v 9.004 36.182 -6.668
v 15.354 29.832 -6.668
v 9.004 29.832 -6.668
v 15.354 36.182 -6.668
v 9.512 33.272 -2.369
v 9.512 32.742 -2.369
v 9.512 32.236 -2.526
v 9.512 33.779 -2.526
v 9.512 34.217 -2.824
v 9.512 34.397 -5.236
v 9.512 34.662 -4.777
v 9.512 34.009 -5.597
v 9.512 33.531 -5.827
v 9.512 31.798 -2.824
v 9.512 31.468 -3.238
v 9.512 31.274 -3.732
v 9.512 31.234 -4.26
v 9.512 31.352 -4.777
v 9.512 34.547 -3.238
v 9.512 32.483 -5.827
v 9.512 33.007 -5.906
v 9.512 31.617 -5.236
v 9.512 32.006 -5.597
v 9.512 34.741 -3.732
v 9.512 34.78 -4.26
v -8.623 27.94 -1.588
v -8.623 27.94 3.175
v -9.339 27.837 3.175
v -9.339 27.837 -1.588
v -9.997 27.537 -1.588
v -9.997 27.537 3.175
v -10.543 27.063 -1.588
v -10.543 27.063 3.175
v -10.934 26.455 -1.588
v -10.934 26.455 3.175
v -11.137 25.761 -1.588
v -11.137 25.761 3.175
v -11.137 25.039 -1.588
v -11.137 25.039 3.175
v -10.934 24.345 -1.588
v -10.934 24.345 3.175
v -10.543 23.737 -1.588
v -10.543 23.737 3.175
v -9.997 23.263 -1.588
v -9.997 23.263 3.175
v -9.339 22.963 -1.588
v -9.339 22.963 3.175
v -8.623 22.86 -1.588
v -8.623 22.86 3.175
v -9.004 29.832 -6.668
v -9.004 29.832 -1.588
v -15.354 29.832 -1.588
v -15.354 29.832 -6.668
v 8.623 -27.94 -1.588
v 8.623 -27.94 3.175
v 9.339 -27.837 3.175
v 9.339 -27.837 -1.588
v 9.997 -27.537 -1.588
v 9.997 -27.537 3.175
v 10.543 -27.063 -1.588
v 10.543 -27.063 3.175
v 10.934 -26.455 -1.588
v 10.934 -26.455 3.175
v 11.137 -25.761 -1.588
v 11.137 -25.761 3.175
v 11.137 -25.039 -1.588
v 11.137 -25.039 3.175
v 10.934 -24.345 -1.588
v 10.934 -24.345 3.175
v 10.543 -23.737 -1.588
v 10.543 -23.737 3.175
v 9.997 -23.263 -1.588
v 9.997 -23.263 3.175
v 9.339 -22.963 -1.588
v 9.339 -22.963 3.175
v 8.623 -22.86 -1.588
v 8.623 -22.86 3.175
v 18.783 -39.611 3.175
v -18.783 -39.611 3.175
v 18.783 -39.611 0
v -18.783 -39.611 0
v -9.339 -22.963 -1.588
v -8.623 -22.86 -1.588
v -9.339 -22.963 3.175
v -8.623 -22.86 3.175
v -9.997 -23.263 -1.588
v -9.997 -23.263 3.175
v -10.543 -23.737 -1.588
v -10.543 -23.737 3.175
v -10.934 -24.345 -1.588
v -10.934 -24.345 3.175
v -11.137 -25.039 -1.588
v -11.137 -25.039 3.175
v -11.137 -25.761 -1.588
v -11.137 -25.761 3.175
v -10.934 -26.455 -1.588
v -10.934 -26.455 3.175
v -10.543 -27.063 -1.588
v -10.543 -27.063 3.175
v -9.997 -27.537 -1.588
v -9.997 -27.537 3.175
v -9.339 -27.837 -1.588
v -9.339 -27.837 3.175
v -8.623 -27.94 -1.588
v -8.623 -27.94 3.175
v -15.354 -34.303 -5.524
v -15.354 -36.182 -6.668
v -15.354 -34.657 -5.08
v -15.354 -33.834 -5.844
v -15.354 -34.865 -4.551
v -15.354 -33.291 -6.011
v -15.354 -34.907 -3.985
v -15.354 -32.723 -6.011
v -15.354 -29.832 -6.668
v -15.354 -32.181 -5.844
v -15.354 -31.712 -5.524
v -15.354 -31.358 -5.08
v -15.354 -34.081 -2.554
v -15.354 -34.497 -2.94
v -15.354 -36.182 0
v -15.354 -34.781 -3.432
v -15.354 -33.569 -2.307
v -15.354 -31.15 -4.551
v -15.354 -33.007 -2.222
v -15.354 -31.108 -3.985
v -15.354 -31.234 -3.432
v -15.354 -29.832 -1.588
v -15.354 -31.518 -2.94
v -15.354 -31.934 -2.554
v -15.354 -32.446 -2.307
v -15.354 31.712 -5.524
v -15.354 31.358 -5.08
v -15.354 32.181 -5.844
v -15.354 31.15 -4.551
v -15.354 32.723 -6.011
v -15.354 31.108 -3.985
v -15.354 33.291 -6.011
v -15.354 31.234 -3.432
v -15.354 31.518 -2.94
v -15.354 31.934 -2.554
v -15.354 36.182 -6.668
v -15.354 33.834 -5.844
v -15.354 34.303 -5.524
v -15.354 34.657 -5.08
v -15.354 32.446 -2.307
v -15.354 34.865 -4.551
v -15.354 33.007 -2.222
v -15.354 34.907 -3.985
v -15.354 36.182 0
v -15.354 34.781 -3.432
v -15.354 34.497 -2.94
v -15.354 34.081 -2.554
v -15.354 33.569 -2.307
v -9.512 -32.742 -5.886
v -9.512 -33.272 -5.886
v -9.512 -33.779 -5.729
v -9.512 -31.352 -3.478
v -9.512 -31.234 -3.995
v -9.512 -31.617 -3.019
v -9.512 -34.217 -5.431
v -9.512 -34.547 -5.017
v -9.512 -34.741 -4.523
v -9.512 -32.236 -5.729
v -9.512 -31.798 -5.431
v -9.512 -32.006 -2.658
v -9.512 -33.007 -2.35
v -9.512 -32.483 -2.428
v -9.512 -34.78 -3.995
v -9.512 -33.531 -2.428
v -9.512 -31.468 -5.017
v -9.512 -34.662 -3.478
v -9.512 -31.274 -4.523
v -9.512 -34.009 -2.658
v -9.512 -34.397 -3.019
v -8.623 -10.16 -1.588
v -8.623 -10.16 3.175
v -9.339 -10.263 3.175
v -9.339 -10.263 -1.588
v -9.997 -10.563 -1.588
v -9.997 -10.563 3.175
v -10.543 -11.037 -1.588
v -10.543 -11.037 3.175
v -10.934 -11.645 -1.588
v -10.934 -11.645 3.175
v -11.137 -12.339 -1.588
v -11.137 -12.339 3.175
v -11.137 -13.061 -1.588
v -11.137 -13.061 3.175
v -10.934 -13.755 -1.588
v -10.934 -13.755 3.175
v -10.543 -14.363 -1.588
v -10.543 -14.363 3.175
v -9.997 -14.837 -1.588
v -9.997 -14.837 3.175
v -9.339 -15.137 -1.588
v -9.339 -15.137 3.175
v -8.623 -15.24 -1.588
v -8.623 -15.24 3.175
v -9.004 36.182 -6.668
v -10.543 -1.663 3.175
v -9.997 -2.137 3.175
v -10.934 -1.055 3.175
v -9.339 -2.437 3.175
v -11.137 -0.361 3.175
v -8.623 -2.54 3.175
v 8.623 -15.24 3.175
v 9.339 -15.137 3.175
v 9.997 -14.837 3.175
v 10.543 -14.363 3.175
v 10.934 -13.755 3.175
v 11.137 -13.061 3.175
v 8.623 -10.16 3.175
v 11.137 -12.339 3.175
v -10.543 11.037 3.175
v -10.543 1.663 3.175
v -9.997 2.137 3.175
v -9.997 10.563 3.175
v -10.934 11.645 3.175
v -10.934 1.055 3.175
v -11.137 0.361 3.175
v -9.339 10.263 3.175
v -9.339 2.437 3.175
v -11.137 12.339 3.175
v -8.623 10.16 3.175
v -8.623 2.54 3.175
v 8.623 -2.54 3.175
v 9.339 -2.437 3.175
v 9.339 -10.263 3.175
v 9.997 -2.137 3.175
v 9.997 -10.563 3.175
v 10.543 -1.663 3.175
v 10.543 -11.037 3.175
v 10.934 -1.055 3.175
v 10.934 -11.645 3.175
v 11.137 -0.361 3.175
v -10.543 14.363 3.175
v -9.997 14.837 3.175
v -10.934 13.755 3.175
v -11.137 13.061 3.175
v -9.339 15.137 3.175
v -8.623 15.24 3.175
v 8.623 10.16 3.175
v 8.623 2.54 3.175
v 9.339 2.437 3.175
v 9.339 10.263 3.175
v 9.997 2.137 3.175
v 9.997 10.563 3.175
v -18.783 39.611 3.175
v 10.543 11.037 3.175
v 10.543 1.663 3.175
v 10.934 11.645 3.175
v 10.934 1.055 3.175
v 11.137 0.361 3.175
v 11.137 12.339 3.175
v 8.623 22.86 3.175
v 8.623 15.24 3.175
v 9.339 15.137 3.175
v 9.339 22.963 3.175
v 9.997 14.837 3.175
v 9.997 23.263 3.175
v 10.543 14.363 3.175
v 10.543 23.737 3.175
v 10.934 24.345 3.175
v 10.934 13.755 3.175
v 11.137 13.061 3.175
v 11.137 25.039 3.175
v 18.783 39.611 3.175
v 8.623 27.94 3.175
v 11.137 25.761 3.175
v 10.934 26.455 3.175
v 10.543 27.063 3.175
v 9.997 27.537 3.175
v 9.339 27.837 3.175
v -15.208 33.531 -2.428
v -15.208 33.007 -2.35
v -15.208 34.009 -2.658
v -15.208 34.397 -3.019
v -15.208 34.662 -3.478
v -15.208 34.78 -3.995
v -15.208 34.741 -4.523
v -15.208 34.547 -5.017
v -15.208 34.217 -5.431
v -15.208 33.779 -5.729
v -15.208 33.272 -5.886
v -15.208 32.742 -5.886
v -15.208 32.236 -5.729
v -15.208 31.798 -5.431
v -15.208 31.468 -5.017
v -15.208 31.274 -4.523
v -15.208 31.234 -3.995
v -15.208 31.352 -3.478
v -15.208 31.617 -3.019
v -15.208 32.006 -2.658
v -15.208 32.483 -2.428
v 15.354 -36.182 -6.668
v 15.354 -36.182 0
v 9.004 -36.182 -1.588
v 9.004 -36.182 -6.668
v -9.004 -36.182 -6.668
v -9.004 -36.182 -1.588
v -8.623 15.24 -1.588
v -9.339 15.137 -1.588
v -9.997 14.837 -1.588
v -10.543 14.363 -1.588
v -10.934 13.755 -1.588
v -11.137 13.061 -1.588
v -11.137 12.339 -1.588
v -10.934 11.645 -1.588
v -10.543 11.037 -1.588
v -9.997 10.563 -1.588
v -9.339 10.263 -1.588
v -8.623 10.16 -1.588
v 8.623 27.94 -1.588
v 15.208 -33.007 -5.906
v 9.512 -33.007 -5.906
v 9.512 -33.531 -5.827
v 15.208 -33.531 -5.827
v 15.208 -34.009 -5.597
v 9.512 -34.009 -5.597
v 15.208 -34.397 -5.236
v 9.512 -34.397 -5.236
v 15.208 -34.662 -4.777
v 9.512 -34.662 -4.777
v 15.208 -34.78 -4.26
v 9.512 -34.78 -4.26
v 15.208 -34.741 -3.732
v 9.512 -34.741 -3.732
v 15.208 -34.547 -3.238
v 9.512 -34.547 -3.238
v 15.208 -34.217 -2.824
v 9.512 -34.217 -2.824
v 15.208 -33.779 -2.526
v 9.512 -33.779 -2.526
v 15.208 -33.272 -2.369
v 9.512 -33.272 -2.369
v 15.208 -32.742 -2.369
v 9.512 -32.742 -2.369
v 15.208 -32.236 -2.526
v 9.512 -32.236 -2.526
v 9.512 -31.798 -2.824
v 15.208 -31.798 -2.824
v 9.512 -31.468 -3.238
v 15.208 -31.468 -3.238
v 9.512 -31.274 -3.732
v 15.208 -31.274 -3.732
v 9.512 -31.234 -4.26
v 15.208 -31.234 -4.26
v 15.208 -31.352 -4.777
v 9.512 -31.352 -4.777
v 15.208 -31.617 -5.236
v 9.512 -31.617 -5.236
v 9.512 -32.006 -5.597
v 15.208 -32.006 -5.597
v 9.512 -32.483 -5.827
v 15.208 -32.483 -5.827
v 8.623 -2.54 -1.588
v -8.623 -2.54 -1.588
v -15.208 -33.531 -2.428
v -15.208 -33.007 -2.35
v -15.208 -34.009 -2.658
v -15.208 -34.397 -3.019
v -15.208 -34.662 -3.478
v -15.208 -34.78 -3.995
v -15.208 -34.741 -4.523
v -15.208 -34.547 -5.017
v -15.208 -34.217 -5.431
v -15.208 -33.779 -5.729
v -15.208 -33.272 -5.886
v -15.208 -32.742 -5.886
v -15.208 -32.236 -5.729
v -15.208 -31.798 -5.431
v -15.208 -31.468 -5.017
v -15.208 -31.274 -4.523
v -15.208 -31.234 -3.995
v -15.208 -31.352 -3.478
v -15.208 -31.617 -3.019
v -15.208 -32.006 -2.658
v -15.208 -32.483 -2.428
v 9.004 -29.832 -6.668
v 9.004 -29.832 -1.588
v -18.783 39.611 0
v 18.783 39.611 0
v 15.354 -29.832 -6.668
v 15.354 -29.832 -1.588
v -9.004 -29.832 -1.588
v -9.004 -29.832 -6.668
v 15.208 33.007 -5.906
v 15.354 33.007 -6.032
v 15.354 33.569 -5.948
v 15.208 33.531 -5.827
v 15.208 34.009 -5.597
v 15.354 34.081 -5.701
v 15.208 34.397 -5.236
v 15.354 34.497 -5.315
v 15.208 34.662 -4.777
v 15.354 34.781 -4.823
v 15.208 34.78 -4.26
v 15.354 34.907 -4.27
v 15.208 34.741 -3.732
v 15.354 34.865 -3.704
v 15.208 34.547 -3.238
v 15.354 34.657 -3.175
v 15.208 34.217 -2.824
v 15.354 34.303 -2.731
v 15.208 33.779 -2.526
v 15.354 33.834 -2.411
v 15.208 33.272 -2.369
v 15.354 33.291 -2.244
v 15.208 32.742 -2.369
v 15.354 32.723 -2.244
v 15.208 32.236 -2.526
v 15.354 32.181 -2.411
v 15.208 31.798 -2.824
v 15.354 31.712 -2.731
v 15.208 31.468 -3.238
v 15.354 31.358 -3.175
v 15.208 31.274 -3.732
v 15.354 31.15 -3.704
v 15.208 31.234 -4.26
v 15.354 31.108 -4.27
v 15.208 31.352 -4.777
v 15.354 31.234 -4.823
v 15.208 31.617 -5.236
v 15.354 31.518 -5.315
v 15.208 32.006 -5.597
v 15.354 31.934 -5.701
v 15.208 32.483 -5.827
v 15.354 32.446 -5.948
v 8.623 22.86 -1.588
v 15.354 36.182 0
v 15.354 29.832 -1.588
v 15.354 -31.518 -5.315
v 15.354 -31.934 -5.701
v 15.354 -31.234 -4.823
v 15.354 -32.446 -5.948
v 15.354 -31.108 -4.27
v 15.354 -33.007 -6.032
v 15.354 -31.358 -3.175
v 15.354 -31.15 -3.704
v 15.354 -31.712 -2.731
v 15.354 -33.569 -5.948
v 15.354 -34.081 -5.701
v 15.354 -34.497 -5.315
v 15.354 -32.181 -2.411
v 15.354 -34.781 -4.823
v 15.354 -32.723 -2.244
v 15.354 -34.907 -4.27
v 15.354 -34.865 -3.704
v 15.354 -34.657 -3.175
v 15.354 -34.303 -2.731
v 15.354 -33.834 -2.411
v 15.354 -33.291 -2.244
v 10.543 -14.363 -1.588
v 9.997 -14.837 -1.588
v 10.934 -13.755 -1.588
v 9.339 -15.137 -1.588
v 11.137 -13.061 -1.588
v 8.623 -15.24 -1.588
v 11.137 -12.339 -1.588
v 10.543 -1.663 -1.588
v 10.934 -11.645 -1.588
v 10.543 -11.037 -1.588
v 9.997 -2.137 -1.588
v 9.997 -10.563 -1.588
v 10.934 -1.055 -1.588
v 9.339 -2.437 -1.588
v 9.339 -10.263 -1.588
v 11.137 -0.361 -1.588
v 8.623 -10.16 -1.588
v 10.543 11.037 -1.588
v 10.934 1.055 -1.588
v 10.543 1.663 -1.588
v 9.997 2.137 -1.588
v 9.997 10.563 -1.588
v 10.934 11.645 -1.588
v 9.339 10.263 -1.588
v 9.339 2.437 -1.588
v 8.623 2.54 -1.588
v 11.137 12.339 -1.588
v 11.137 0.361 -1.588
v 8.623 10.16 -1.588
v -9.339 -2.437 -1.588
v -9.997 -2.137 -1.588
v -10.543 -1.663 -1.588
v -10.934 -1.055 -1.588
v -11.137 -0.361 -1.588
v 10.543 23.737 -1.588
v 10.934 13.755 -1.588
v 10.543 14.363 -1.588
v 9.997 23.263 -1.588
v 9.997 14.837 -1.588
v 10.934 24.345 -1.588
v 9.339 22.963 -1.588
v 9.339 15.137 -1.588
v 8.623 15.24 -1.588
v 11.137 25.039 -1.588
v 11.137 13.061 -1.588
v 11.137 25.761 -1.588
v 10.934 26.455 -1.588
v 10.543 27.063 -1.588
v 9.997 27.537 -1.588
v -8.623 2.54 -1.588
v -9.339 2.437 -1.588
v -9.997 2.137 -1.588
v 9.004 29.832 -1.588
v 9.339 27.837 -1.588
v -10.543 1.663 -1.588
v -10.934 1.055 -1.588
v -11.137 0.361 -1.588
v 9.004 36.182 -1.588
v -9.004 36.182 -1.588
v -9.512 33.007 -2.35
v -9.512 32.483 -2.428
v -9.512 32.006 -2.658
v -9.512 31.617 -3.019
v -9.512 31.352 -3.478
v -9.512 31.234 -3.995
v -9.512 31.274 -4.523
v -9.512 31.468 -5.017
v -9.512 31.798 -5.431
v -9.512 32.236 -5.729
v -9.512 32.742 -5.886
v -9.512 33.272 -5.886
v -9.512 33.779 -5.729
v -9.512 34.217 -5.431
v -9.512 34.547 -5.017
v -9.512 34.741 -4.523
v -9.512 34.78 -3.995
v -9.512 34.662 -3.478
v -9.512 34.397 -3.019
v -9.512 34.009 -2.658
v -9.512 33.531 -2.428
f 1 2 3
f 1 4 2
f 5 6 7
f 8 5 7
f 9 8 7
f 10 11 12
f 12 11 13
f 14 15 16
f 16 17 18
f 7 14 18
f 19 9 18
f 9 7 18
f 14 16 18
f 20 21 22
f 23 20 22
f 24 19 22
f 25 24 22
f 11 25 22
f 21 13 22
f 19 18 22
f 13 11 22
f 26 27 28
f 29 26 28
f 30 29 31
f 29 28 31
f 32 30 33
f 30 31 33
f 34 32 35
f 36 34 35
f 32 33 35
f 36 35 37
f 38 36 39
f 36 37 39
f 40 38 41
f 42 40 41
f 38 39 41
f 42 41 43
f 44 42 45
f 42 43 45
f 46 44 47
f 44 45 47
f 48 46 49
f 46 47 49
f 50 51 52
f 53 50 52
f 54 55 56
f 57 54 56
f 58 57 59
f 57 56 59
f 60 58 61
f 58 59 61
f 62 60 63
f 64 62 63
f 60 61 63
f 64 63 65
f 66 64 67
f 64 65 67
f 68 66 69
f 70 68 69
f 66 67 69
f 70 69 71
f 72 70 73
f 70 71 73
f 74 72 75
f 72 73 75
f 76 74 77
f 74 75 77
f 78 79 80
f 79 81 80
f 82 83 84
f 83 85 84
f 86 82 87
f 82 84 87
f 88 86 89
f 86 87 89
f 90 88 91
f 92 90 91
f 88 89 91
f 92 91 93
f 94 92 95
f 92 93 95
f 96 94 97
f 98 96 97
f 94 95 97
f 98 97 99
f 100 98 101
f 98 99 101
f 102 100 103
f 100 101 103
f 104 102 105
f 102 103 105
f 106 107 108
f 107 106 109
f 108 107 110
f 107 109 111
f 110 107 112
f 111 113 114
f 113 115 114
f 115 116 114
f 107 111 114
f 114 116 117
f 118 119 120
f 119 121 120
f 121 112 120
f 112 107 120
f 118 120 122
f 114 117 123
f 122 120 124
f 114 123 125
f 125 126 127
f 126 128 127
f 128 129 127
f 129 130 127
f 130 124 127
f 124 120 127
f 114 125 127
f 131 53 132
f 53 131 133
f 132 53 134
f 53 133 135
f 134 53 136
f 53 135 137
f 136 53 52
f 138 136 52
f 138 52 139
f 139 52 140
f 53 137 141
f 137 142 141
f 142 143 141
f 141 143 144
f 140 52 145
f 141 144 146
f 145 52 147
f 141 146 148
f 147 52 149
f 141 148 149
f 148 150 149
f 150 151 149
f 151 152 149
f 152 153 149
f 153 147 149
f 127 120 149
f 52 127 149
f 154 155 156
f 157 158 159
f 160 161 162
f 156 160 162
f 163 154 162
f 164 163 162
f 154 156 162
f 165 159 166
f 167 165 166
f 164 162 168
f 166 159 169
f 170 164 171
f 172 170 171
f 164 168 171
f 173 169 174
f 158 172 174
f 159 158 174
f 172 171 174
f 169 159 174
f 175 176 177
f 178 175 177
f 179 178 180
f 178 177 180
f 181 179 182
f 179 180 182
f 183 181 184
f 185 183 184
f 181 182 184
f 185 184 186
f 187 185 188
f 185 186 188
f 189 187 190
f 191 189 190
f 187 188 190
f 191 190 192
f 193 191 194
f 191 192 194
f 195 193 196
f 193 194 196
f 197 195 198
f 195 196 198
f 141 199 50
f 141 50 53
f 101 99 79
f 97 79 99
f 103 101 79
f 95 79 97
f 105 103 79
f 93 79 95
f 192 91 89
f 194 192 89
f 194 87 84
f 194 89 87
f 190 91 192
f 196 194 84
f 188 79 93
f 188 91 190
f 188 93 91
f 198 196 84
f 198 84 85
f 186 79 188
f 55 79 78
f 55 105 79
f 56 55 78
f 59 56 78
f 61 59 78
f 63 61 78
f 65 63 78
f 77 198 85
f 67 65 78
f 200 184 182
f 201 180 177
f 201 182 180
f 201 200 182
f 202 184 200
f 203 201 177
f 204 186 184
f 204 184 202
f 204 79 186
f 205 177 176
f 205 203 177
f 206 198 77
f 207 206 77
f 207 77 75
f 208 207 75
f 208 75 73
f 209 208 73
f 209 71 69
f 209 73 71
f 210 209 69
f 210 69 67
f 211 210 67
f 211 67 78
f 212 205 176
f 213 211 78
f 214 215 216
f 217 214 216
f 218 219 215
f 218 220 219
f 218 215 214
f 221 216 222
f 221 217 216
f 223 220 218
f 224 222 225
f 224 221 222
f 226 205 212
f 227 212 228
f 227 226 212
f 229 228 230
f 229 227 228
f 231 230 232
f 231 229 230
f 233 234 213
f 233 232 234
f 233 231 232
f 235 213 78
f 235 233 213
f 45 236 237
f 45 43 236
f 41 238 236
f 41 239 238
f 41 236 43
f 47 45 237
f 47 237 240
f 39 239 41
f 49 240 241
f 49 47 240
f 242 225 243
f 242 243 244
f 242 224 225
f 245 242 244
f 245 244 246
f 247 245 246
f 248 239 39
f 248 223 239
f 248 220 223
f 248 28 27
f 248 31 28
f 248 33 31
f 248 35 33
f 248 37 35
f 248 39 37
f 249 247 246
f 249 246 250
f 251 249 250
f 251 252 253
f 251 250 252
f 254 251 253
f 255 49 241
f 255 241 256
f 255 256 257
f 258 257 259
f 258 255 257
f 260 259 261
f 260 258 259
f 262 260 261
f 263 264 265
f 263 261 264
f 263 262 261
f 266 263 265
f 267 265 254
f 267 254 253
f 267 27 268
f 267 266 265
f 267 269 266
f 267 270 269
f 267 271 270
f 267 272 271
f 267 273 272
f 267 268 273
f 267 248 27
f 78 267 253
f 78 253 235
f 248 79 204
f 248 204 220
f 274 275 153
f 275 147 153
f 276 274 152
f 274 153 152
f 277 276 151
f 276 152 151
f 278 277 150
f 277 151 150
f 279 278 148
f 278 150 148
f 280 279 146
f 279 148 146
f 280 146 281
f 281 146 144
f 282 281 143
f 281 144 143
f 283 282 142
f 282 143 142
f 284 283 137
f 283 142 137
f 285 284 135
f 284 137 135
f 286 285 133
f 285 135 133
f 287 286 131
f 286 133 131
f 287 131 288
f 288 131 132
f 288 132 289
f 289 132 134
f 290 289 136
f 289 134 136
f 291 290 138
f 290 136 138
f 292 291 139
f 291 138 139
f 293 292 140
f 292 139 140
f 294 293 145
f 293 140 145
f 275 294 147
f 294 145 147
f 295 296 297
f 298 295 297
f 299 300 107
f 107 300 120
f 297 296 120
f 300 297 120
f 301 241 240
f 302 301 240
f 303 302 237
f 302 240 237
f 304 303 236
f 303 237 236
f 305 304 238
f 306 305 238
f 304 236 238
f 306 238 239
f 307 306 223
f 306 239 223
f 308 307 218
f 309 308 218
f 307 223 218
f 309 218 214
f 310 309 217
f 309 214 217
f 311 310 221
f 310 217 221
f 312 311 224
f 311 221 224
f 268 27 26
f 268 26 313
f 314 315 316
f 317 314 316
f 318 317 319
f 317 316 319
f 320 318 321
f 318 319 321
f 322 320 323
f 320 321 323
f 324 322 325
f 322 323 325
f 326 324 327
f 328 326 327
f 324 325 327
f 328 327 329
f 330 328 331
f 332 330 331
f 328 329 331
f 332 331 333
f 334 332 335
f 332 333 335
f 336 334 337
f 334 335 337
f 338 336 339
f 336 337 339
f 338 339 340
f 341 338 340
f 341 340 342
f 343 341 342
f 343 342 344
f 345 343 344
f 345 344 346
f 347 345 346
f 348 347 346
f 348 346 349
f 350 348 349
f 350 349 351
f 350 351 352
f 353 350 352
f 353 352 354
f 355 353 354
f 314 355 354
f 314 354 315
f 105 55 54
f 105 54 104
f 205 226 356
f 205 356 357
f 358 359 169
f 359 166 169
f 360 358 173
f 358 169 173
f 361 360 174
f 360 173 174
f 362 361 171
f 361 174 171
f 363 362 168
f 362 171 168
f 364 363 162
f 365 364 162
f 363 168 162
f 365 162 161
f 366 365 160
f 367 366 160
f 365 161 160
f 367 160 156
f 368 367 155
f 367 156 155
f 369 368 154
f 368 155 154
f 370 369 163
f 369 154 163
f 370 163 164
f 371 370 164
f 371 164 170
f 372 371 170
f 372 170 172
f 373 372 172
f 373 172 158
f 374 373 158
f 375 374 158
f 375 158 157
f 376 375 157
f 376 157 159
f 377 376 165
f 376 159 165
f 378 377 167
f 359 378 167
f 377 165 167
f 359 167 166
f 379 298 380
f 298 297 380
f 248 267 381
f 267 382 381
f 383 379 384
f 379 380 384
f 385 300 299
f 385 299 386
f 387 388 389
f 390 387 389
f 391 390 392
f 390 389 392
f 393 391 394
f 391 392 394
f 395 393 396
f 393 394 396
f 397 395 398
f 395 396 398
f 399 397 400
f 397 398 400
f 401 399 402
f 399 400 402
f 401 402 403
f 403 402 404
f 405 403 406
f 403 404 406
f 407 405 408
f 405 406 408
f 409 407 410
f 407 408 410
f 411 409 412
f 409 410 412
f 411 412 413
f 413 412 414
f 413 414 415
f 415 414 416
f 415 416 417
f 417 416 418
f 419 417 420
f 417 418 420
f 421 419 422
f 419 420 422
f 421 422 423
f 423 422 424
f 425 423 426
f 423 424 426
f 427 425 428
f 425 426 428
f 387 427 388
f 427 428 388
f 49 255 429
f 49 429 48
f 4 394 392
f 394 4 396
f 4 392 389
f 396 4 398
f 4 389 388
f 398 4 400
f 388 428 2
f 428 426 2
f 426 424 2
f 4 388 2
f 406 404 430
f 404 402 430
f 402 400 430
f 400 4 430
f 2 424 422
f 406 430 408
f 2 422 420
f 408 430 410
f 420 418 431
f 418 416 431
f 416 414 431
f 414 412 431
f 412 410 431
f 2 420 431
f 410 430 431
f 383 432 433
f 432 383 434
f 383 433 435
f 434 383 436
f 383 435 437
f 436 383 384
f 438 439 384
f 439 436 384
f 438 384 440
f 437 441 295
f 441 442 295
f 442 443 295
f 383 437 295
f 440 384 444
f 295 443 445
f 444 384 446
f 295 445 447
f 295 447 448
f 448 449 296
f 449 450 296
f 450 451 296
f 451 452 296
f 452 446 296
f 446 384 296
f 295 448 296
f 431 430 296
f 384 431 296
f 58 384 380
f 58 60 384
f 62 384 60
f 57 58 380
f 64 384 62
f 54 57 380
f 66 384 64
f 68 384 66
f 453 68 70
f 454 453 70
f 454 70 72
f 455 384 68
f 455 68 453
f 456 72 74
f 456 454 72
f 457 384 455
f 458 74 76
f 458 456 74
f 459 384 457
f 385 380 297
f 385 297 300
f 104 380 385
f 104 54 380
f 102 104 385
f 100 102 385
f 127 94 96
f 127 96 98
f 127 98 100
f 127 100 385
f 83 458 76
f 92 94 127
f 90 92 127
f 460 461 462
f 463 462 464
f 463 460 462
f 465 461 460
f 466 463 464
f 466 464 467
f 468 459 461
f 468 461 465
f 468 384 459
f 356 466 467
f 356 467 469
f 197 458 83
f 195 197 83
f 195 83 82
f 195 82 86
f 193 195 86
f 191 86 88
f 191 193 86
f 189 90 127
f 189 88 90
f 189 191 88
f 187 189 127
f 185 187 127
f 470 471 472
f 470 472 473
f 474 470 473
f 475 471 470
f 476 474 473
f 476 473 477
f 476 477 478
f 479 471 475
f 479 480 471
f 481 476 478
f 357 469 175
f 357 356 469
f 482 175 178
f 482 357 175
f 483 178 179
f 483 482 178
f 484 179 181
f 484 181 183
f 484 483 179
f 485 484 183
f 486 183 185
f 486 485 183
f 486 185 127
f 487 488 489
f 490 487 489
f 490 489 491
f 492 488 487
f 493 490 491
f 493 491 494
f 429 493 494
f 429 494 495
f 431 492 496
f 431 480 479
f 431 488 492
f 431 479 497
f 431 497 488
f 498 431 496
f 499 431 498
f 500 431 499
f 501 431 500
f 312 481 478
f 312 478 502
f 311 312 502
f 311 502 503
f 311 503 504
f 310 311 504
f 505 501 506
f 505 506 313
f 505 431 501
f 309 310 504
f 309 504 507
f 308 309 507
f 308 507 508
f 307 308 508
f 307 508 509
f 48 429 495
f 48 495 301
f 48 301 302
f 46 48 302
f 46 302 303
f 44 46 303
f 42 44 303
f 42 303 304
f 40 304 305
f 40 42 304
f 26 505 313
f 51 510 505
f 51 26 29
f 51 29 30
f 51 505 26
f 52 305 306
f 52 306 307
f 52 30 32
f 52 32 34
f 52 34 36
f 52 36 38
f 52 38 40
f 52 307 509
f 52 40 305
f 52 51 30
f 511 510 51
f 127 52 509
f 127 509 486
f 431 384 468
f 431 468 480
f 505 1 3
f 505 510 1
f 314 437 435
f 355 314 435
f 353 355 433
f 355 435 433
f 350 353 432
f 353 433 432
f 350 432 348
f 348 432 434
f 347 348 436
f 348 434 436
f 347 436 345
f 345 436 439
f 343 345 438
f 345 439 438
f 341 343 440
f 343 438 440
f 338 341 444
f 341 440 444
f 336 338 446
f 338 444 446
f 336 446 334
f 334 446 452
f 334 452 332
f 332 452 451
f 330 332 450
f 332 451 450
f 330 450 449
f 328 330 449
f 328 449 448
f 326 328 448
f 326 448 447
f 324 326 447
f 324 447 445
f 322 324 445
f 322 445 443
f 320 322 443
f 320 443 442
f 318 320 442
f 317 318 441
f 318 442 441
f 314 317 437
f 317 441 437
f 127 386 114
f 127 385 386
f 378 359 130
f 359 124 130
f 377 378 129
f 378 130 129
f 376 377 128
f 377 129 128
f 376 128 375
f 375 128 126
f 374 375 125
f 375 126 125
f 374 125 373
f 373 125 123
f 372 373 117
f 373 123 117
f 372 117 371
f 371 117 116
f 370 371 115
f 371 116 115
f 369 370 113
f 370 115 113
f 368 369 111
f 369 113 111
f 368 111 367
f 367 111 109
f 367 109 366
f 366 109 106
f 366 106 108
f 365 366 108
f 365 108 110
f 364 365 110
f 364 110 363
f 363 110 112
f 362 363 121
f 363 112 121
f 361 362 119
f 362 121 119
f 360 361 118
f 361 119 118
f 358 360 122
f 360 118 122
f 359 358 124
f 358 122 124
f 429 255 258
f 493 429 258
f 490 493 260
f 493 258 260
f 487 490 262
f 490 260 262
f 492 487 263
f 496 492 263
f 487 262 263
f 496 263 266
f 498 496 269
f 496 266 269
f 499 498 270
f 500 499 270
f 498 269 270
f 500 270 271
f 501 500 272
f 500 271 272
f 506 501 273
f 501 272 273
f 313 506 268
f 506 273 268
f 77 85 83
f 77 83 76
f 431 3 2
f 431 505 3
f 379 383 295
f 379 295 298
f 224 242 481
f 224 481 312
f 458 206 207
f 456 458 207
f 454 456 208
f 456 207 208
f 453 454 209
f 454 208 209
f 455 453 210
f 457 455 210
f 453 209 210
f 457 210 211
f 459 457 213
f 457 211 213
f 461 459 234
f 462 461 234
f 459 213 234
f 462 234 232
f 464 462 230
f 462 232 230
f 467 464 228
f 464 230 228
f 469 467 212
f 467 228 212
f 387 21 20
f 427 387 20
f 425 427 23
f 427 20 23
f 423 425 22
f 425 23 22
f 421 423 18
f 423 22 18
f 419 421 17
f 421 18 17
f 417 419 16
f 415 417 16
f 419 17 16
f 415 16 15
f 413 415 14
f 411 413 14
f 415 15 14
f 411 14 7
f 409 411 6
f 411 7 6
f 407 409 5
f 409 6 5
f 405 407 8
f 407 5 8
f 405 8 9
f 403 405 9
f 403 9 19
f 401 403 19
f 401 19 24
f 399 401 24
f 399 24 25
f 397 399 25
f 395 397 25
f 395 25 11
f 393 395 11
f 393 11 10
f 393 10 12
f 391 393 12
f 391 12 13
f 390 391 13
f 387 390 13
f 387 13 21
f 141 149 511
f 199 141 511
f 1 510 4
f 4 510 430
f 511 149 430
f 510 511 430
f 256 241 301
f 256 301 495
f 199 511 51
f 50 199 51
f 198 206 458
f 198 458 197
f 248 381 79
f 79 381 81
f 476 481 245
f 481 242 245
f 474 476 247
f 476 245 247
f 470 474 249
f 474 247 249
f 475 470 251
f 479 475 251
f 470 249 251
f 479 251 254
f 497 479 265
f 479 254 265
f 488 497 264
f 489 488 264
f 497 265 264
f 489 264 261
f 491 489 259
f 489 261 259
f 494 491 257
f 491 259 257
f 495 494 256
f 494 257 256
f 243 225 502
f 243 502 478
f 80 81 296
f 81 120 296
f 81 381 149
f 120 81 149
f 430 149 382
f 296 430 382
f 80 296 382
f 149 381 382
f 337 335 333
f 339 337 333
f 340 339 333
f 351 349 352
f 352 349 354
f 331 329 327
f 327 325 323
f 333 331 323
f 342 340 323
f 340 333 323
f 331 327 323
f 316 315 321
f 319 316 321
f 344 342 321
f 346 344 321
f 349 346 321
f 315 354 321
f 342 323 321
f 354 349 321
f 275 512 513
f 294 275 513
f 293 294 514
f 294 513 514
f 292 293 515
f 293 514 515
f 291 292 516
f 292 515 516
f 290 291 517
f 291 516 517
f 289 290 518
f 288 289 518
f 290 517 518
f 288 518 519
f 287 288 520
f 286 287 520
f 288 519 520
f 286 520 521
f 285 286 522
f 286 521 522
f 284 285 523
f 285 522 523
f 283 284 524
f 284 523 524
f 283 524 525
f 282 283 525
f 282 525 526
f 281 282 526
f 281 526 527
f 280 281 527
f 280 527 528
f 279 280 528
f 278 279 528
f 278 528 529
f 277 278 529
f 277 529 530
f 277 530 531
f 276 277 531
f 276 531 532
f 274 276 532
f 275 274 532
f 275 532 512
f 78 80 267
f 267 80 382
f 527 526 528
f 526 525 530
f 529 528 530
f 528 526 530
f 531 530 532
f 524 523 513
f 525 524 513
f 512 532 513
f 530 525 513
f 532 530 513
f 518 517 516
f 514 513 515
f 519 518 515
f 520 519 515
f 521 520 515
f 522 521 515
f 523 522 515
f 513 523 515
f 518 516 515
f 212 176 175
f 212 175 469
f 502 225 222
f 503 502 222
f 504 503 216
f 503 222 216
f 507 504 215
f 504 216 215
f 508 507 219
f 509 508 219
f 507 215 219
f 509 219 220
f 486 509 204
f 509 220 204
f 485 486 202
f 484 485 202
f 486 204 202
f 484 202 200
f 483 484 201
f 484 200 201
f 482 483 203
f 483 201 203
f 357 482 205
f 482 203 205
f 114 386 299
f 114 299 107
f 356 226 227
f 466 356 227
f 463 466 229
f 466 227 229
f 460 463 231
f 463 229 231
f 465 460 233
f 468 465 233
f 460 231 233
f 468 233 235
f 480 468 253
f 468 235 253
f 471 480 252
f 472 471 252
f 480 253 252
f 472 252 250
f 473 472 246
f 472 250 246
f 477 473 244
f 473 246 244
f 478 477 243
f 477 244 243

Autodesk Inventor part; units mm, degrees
ref_plane "YZ Plane" through (0, 0, 0) normal (1, 0, 0) x (0, 1, 0)
ref_plane "XZ Plane" through (0, 0, 0) normal (0, 1, 0) x (-1, 0, 0)
ref_plane "XY Plane" through (0, 0, 0) normal (0, 0, 1) x (1, 0, 0)
sketch "Sketch1" plane through (0, 0, 0) normal (0, 0, 1) x (1, 0, 0)
  line L0 (-18.7833, 39.6114) -> (-18.7833, -39.6114) projected
  line L1 (-18.7833, -39.6114) -> (18.7833, -39.6114) projected
  line L2 (18.7833, -39.6114) -> (18.7833, 39.6114) projected
  line L3 (18.7833, 39.6114) -> (-18.7833, 39.6114) projected
  line L4 (-15.6083, 36.4364) -> (15.6083, 36.4364) projected
  line L5 (15.6083, 36.4364) -> (15.6083, -36.4364) projected
  line L6 (15.6083, -36.4364) -> (-15.6083, -36.4364) projected
  line L7 (-15.6083, -36.4364) -> (-15.6083, 36.4364) projected
  point P0 (0, 0)
extrude "Extrusion1" add sketch "Sketch1" along normal blind 3.175 contours L3 L2 L1 L0 | L4 L5 L6 L7
sketch "Sketch2" plane through (0, 0, 0) normal (0, 0, -1) x (-1, 0, 0)
  line L0 (-15.6083, -36.4364) -> (15.6083, -36.4364) projected
  line L1 (-15.6083, 36.4364) -> (-15.6083, -36.4364) projected
  line L2 (15.6083, 36.4364) -> (-15.6083, 36.4364) projected
  line L3 (15.6083, -36.4364) -> (15.6083, 36.4364) projected
  line L4 (-15.3543, 36.1824) -> (-15.3543, -36.1824)
  line L5 (-15.3543, -36.1824) -> (15.3543, -36.1824)
  line L6 (15.3543, -36.1824) -> (15.3543, 36.1824)
  line L7 (15.3543, 36.1824) -> (-15.3543, 36.1824)
  point P0 (0, 0)
  dimension "d2" = 0.254
extrude "Extrusion2" add sketch "Sketch2" along normal blind 1.5875 contours L7 L6 L5 L4
sketch "Sketch3" plane through (0, 0, -1.5875) normal (0, 0, -1) x (-1, 0, 0)
  line L0 (-15.3543, 36.1824) -> (-15.3543, -36.1824) projected
  line L1 (-15.3543, 36.1824) -> (-9.0043, 36.1824)
  line L2 (-9.0043, 36.1824) -> (-9.0043, 29.8324)
  line L3 (-9.0043, 29.8324) -> (-15.3543, 29.8324)
  line L4 (-15.3543, 29.8324) -> (-15.3543, 36.1824)
  line L5 (15.3543, 36.1824) -> (-15.3543, 36.1824) projected
  line L6 (15.3543, 36.1824) -> (9.0043, 36.1824)
  line L7 (9.0043, 36.1824) -> (9.0043, 29.8324)
  line L8 (9.0043, 29.8324) -> (15.3543, 29.8324)
  line L9 (15.3543, 29.8324) -> (15.3543, 36.1824)
  line L10 (-15.3543, -36.1824) -> (15.3543, -36.1824) projected
  line L11 (-15.3543, -36.1824) -> (-9.0043, -36.1824)
  line L12 (-9.0043, -36.1824) -> (-9.0043, -29.8324)
  line L13 (-9.0043, -29.8324) -> (-15.3543, -29.8324)
  line L14 (-15.3543, -29.8324) -> (-15.3543, -36.1824)
  line L15 (15.3543, 36.1824) -> (15.3543, -36.1824) projected
  line L16 (15.3543, -36.1824) -> (9.0043, -36.1824)
  line L17 (9.0043, -36.1824) -> (9.0043, -29.8324)
  line L18 (9.0043, -29.8324) -> (15.3543, -29.8324)
  line L19 (15.3543, -29.8324) -> (15.3543, -36.1824)
  point P0 (0, 0)
  dimension "d5" = 6.35
  dimension "d6" = 6.35
  dimension "d7" = 6.35
  dimension "d8" = 6.35
  dimension "d9" = 6.35
  dimension "d10" = 6.35
  dimension "d11" = 6.35
  dimension "d12" = 6.35
extrude "Extrusion3" add sketch "Sketch3" along normal blind 5.08 contours L1 L2 L3 L0 | L13 L12 L10 L0 | L5 L9 L8 L7 | L17 L18 L15 L10
sketch "Sketch4" plane through (15.3543, -36.1824, 0) normal (1, 0, 0) x (0, 0, -1)
  line L0 (6.6675, 66.0147) -> (6.6675, 72.3647) projected
  line L1 (0, 72.3647) -> (0, 0) projected
  line L2 (6.6675, 0) -> (6.6675, 6.35) projected
  line L3 (1.5875, 66.0147) -> (1.5875, 6.35) projected
  line L4 (0, 72.3647) -> (6.6675, 72.3647) projected
  line L5 (1.5875, 66.0147) -> (6.6675, 72.3647)
  line L6 (1.5875, 6.35) -> (6.6675, 6.35) projected
  line L7 (6.6675, 6.35) -> (6.6675, 0) projected
  line L8 (1.5875, 6.35) -> (6.6675, 0)
  point P0 (0, 36.1824)
  point P1 (4.1275, 3.175)
  point P2 (4.1275, 69.1897)
sketch "Sketch5" plane through (-15.3543, -36.1824, 0) normal (-1, 0, 0) x (0, 0, 1)
  point P0 (0, 36.1824)
  point P1 (-4.1275, 69.1897)
  point P2 (-4.1275, 3.175)
hole "Hole1" at (15.3543, 33.0074, -4.1275) at (15.3543, -33.0074, -4.1275) direction (-1, 0, 0) diameter 3.556 depth 5.842 countersink diameter 3.81 countersink angle 82
hole "Hole2" at (-15.3543, 33.0074, -4.1275) at (-15.3543, -33.0074, -4.1275) direction (1, 0, 0) diameter 3.556 depth 5.842 countersink diameter 3.81 countersink angle 82
sketch "Sketch6" plane through (0, 0, 3.175) normal (0, 0, 1) x (1, 0, 0)
  line L0 (-8.6233, 0) -> (8.6233, 0) construction
  line L1 (-8.6233, 2.54) -> (8.6233, 2.54)
  line L2 (8.6233, -2.54) -> (-8.6233, -2.54)
  arc A0 (-8.6233, 2.54) -> (-8.6233, -2.54) centre (-8.6233, 0) ccw
  arc A1 (8.6233, -2.54) -> (8.6233, 2.54) centre (8.6233, 0) ccw
  line L3 (-18.7833, 39.6114) -> (-18.7833, -39.6114) projected
  line L4 (18.7833, -39.6114) -> (18.7833, 39.6114) projected
  line L5 (-18.7833, -39.6114) -> (18.7833, -39.6114) projected
  arc A2 (8.6233, 10.16) -> (8.6233, 15.24) centre (8.6233, 12.7) ccw
  line L6 (-8.6233, 15.24) -> (8.6233, 15.24)
  line L7 (8.6233, 10.16) -> (-8.6233, 10.16)
  arc A3 (-8.6233, 15.24) -> (-8.6233, 10.16) centre (-8.6233, 12.7) ccw
  arc A4 (8.6233, 22.86) -> (8.6233, 27.94) centre (8.6233, 25.4) ccw
  line L8 (-8.6233, 27.94) -> (8.6233, 27.94)
  line L9 (8.6233, 22.86) -> (-8.6233, 22.86)
  arc A5 (-8.6233, 27.94) -> (-8.6233, 22.86) centre (-8.6233, 25.4) ccw
  arc A6 (8.6233, -15.24) -> (8.6233, -10.16) centre (8.6233, -12.7) ccw
  line L10 (-8.6233, -10.16) -> (8.6233, -10.16)
  line L11 (8.6233, -15.24) -> (-8.6233, -15.24)
  arc A7 (-8.6233, -10.16) -> (-8.6233, -15.24) centre (-8.6233, -12.7) ccw
  arc A8 (8.6233, -2.54) -> (8.6233, 2.54) centre (8.6233, 0) ccw
  line L12 (-8.6233, 2.54) -> (8.6233, 2.54)
  line L13 (8.6233, -2.54) -> (-8.6233, -2.54)
  arc A9 (-8.6233, 2.54) -> (-8.6233, -2.54) centre (-8.6233, 0) ccw
  arc A10 (8.6233, 10.16) -> (8.6233, 15.24) centre (8.6233, 12.7) ccw
  line L14 (-8.6233, 15.24) -> (8.6233, 15.24)
  line L15 (8.6233, 10.16) -> (-8.6233, 10.16)
  arc A11 (-8.6233, 15.24) -> (-8.6233, 10.16) centre (-8.6233, 12.7) ccw
  arc A12 (8.6233, -27.94) -> (8.6233, -22.86) centre (8.6233, -25.4) ccw
  line L16 (-8.6233, -22.86) -> (8.6233, -22.86)
  line L17 (8.6233, -27.94) -> (-8.6233, -27.94)
  arc A13 (-8.6233, -22.86) -> (-8.6233, -27.94) centre (-8.6233, -25.4) ccw
  arc A14 (8.6233, -15.24) -> (8.6233, -10.16) centre (8.6233, -12.7) ccw
  line L18 (-8.6233, -10.16) -> (8.6233, -10.16)
  line L19 (8.6233, -15.24) -> (-8.6233, -15.24)
  arc A15 (-8.6233, -10.16) -> (-8.6233, -15.24) centre (-8.6233, -12.7) ccw
  arc A16 (8.6233, -2.54) -> (8.6233, 2.54) centre (8.6233, 0) ccw
  line L20 (-8.6233, 2.54) -> (8.6233, 2.54)
  line L21 (8.6233, -2.54) -> (-8.6233, -2.54)
  arc A17 (-8.6233, 2.54) -> (-8.6233, -2.54) centre (-8.6233, 0) ccw
  point P0 (0, 0)
  point P1 (0, 0)
  dimension "d29" = 10.16
  dimension "d30" = 10.16
  dimension "d31" = 2.54
  dimension "d35" = 12.7
  dimension "d38" = 12.7
extrude "Extrusion4" cut sketch "Sketch6" against normal up to surface (4.7625 mm away)
properties part number "SENSOR_TOP" material "PC/ABS Plastic"
